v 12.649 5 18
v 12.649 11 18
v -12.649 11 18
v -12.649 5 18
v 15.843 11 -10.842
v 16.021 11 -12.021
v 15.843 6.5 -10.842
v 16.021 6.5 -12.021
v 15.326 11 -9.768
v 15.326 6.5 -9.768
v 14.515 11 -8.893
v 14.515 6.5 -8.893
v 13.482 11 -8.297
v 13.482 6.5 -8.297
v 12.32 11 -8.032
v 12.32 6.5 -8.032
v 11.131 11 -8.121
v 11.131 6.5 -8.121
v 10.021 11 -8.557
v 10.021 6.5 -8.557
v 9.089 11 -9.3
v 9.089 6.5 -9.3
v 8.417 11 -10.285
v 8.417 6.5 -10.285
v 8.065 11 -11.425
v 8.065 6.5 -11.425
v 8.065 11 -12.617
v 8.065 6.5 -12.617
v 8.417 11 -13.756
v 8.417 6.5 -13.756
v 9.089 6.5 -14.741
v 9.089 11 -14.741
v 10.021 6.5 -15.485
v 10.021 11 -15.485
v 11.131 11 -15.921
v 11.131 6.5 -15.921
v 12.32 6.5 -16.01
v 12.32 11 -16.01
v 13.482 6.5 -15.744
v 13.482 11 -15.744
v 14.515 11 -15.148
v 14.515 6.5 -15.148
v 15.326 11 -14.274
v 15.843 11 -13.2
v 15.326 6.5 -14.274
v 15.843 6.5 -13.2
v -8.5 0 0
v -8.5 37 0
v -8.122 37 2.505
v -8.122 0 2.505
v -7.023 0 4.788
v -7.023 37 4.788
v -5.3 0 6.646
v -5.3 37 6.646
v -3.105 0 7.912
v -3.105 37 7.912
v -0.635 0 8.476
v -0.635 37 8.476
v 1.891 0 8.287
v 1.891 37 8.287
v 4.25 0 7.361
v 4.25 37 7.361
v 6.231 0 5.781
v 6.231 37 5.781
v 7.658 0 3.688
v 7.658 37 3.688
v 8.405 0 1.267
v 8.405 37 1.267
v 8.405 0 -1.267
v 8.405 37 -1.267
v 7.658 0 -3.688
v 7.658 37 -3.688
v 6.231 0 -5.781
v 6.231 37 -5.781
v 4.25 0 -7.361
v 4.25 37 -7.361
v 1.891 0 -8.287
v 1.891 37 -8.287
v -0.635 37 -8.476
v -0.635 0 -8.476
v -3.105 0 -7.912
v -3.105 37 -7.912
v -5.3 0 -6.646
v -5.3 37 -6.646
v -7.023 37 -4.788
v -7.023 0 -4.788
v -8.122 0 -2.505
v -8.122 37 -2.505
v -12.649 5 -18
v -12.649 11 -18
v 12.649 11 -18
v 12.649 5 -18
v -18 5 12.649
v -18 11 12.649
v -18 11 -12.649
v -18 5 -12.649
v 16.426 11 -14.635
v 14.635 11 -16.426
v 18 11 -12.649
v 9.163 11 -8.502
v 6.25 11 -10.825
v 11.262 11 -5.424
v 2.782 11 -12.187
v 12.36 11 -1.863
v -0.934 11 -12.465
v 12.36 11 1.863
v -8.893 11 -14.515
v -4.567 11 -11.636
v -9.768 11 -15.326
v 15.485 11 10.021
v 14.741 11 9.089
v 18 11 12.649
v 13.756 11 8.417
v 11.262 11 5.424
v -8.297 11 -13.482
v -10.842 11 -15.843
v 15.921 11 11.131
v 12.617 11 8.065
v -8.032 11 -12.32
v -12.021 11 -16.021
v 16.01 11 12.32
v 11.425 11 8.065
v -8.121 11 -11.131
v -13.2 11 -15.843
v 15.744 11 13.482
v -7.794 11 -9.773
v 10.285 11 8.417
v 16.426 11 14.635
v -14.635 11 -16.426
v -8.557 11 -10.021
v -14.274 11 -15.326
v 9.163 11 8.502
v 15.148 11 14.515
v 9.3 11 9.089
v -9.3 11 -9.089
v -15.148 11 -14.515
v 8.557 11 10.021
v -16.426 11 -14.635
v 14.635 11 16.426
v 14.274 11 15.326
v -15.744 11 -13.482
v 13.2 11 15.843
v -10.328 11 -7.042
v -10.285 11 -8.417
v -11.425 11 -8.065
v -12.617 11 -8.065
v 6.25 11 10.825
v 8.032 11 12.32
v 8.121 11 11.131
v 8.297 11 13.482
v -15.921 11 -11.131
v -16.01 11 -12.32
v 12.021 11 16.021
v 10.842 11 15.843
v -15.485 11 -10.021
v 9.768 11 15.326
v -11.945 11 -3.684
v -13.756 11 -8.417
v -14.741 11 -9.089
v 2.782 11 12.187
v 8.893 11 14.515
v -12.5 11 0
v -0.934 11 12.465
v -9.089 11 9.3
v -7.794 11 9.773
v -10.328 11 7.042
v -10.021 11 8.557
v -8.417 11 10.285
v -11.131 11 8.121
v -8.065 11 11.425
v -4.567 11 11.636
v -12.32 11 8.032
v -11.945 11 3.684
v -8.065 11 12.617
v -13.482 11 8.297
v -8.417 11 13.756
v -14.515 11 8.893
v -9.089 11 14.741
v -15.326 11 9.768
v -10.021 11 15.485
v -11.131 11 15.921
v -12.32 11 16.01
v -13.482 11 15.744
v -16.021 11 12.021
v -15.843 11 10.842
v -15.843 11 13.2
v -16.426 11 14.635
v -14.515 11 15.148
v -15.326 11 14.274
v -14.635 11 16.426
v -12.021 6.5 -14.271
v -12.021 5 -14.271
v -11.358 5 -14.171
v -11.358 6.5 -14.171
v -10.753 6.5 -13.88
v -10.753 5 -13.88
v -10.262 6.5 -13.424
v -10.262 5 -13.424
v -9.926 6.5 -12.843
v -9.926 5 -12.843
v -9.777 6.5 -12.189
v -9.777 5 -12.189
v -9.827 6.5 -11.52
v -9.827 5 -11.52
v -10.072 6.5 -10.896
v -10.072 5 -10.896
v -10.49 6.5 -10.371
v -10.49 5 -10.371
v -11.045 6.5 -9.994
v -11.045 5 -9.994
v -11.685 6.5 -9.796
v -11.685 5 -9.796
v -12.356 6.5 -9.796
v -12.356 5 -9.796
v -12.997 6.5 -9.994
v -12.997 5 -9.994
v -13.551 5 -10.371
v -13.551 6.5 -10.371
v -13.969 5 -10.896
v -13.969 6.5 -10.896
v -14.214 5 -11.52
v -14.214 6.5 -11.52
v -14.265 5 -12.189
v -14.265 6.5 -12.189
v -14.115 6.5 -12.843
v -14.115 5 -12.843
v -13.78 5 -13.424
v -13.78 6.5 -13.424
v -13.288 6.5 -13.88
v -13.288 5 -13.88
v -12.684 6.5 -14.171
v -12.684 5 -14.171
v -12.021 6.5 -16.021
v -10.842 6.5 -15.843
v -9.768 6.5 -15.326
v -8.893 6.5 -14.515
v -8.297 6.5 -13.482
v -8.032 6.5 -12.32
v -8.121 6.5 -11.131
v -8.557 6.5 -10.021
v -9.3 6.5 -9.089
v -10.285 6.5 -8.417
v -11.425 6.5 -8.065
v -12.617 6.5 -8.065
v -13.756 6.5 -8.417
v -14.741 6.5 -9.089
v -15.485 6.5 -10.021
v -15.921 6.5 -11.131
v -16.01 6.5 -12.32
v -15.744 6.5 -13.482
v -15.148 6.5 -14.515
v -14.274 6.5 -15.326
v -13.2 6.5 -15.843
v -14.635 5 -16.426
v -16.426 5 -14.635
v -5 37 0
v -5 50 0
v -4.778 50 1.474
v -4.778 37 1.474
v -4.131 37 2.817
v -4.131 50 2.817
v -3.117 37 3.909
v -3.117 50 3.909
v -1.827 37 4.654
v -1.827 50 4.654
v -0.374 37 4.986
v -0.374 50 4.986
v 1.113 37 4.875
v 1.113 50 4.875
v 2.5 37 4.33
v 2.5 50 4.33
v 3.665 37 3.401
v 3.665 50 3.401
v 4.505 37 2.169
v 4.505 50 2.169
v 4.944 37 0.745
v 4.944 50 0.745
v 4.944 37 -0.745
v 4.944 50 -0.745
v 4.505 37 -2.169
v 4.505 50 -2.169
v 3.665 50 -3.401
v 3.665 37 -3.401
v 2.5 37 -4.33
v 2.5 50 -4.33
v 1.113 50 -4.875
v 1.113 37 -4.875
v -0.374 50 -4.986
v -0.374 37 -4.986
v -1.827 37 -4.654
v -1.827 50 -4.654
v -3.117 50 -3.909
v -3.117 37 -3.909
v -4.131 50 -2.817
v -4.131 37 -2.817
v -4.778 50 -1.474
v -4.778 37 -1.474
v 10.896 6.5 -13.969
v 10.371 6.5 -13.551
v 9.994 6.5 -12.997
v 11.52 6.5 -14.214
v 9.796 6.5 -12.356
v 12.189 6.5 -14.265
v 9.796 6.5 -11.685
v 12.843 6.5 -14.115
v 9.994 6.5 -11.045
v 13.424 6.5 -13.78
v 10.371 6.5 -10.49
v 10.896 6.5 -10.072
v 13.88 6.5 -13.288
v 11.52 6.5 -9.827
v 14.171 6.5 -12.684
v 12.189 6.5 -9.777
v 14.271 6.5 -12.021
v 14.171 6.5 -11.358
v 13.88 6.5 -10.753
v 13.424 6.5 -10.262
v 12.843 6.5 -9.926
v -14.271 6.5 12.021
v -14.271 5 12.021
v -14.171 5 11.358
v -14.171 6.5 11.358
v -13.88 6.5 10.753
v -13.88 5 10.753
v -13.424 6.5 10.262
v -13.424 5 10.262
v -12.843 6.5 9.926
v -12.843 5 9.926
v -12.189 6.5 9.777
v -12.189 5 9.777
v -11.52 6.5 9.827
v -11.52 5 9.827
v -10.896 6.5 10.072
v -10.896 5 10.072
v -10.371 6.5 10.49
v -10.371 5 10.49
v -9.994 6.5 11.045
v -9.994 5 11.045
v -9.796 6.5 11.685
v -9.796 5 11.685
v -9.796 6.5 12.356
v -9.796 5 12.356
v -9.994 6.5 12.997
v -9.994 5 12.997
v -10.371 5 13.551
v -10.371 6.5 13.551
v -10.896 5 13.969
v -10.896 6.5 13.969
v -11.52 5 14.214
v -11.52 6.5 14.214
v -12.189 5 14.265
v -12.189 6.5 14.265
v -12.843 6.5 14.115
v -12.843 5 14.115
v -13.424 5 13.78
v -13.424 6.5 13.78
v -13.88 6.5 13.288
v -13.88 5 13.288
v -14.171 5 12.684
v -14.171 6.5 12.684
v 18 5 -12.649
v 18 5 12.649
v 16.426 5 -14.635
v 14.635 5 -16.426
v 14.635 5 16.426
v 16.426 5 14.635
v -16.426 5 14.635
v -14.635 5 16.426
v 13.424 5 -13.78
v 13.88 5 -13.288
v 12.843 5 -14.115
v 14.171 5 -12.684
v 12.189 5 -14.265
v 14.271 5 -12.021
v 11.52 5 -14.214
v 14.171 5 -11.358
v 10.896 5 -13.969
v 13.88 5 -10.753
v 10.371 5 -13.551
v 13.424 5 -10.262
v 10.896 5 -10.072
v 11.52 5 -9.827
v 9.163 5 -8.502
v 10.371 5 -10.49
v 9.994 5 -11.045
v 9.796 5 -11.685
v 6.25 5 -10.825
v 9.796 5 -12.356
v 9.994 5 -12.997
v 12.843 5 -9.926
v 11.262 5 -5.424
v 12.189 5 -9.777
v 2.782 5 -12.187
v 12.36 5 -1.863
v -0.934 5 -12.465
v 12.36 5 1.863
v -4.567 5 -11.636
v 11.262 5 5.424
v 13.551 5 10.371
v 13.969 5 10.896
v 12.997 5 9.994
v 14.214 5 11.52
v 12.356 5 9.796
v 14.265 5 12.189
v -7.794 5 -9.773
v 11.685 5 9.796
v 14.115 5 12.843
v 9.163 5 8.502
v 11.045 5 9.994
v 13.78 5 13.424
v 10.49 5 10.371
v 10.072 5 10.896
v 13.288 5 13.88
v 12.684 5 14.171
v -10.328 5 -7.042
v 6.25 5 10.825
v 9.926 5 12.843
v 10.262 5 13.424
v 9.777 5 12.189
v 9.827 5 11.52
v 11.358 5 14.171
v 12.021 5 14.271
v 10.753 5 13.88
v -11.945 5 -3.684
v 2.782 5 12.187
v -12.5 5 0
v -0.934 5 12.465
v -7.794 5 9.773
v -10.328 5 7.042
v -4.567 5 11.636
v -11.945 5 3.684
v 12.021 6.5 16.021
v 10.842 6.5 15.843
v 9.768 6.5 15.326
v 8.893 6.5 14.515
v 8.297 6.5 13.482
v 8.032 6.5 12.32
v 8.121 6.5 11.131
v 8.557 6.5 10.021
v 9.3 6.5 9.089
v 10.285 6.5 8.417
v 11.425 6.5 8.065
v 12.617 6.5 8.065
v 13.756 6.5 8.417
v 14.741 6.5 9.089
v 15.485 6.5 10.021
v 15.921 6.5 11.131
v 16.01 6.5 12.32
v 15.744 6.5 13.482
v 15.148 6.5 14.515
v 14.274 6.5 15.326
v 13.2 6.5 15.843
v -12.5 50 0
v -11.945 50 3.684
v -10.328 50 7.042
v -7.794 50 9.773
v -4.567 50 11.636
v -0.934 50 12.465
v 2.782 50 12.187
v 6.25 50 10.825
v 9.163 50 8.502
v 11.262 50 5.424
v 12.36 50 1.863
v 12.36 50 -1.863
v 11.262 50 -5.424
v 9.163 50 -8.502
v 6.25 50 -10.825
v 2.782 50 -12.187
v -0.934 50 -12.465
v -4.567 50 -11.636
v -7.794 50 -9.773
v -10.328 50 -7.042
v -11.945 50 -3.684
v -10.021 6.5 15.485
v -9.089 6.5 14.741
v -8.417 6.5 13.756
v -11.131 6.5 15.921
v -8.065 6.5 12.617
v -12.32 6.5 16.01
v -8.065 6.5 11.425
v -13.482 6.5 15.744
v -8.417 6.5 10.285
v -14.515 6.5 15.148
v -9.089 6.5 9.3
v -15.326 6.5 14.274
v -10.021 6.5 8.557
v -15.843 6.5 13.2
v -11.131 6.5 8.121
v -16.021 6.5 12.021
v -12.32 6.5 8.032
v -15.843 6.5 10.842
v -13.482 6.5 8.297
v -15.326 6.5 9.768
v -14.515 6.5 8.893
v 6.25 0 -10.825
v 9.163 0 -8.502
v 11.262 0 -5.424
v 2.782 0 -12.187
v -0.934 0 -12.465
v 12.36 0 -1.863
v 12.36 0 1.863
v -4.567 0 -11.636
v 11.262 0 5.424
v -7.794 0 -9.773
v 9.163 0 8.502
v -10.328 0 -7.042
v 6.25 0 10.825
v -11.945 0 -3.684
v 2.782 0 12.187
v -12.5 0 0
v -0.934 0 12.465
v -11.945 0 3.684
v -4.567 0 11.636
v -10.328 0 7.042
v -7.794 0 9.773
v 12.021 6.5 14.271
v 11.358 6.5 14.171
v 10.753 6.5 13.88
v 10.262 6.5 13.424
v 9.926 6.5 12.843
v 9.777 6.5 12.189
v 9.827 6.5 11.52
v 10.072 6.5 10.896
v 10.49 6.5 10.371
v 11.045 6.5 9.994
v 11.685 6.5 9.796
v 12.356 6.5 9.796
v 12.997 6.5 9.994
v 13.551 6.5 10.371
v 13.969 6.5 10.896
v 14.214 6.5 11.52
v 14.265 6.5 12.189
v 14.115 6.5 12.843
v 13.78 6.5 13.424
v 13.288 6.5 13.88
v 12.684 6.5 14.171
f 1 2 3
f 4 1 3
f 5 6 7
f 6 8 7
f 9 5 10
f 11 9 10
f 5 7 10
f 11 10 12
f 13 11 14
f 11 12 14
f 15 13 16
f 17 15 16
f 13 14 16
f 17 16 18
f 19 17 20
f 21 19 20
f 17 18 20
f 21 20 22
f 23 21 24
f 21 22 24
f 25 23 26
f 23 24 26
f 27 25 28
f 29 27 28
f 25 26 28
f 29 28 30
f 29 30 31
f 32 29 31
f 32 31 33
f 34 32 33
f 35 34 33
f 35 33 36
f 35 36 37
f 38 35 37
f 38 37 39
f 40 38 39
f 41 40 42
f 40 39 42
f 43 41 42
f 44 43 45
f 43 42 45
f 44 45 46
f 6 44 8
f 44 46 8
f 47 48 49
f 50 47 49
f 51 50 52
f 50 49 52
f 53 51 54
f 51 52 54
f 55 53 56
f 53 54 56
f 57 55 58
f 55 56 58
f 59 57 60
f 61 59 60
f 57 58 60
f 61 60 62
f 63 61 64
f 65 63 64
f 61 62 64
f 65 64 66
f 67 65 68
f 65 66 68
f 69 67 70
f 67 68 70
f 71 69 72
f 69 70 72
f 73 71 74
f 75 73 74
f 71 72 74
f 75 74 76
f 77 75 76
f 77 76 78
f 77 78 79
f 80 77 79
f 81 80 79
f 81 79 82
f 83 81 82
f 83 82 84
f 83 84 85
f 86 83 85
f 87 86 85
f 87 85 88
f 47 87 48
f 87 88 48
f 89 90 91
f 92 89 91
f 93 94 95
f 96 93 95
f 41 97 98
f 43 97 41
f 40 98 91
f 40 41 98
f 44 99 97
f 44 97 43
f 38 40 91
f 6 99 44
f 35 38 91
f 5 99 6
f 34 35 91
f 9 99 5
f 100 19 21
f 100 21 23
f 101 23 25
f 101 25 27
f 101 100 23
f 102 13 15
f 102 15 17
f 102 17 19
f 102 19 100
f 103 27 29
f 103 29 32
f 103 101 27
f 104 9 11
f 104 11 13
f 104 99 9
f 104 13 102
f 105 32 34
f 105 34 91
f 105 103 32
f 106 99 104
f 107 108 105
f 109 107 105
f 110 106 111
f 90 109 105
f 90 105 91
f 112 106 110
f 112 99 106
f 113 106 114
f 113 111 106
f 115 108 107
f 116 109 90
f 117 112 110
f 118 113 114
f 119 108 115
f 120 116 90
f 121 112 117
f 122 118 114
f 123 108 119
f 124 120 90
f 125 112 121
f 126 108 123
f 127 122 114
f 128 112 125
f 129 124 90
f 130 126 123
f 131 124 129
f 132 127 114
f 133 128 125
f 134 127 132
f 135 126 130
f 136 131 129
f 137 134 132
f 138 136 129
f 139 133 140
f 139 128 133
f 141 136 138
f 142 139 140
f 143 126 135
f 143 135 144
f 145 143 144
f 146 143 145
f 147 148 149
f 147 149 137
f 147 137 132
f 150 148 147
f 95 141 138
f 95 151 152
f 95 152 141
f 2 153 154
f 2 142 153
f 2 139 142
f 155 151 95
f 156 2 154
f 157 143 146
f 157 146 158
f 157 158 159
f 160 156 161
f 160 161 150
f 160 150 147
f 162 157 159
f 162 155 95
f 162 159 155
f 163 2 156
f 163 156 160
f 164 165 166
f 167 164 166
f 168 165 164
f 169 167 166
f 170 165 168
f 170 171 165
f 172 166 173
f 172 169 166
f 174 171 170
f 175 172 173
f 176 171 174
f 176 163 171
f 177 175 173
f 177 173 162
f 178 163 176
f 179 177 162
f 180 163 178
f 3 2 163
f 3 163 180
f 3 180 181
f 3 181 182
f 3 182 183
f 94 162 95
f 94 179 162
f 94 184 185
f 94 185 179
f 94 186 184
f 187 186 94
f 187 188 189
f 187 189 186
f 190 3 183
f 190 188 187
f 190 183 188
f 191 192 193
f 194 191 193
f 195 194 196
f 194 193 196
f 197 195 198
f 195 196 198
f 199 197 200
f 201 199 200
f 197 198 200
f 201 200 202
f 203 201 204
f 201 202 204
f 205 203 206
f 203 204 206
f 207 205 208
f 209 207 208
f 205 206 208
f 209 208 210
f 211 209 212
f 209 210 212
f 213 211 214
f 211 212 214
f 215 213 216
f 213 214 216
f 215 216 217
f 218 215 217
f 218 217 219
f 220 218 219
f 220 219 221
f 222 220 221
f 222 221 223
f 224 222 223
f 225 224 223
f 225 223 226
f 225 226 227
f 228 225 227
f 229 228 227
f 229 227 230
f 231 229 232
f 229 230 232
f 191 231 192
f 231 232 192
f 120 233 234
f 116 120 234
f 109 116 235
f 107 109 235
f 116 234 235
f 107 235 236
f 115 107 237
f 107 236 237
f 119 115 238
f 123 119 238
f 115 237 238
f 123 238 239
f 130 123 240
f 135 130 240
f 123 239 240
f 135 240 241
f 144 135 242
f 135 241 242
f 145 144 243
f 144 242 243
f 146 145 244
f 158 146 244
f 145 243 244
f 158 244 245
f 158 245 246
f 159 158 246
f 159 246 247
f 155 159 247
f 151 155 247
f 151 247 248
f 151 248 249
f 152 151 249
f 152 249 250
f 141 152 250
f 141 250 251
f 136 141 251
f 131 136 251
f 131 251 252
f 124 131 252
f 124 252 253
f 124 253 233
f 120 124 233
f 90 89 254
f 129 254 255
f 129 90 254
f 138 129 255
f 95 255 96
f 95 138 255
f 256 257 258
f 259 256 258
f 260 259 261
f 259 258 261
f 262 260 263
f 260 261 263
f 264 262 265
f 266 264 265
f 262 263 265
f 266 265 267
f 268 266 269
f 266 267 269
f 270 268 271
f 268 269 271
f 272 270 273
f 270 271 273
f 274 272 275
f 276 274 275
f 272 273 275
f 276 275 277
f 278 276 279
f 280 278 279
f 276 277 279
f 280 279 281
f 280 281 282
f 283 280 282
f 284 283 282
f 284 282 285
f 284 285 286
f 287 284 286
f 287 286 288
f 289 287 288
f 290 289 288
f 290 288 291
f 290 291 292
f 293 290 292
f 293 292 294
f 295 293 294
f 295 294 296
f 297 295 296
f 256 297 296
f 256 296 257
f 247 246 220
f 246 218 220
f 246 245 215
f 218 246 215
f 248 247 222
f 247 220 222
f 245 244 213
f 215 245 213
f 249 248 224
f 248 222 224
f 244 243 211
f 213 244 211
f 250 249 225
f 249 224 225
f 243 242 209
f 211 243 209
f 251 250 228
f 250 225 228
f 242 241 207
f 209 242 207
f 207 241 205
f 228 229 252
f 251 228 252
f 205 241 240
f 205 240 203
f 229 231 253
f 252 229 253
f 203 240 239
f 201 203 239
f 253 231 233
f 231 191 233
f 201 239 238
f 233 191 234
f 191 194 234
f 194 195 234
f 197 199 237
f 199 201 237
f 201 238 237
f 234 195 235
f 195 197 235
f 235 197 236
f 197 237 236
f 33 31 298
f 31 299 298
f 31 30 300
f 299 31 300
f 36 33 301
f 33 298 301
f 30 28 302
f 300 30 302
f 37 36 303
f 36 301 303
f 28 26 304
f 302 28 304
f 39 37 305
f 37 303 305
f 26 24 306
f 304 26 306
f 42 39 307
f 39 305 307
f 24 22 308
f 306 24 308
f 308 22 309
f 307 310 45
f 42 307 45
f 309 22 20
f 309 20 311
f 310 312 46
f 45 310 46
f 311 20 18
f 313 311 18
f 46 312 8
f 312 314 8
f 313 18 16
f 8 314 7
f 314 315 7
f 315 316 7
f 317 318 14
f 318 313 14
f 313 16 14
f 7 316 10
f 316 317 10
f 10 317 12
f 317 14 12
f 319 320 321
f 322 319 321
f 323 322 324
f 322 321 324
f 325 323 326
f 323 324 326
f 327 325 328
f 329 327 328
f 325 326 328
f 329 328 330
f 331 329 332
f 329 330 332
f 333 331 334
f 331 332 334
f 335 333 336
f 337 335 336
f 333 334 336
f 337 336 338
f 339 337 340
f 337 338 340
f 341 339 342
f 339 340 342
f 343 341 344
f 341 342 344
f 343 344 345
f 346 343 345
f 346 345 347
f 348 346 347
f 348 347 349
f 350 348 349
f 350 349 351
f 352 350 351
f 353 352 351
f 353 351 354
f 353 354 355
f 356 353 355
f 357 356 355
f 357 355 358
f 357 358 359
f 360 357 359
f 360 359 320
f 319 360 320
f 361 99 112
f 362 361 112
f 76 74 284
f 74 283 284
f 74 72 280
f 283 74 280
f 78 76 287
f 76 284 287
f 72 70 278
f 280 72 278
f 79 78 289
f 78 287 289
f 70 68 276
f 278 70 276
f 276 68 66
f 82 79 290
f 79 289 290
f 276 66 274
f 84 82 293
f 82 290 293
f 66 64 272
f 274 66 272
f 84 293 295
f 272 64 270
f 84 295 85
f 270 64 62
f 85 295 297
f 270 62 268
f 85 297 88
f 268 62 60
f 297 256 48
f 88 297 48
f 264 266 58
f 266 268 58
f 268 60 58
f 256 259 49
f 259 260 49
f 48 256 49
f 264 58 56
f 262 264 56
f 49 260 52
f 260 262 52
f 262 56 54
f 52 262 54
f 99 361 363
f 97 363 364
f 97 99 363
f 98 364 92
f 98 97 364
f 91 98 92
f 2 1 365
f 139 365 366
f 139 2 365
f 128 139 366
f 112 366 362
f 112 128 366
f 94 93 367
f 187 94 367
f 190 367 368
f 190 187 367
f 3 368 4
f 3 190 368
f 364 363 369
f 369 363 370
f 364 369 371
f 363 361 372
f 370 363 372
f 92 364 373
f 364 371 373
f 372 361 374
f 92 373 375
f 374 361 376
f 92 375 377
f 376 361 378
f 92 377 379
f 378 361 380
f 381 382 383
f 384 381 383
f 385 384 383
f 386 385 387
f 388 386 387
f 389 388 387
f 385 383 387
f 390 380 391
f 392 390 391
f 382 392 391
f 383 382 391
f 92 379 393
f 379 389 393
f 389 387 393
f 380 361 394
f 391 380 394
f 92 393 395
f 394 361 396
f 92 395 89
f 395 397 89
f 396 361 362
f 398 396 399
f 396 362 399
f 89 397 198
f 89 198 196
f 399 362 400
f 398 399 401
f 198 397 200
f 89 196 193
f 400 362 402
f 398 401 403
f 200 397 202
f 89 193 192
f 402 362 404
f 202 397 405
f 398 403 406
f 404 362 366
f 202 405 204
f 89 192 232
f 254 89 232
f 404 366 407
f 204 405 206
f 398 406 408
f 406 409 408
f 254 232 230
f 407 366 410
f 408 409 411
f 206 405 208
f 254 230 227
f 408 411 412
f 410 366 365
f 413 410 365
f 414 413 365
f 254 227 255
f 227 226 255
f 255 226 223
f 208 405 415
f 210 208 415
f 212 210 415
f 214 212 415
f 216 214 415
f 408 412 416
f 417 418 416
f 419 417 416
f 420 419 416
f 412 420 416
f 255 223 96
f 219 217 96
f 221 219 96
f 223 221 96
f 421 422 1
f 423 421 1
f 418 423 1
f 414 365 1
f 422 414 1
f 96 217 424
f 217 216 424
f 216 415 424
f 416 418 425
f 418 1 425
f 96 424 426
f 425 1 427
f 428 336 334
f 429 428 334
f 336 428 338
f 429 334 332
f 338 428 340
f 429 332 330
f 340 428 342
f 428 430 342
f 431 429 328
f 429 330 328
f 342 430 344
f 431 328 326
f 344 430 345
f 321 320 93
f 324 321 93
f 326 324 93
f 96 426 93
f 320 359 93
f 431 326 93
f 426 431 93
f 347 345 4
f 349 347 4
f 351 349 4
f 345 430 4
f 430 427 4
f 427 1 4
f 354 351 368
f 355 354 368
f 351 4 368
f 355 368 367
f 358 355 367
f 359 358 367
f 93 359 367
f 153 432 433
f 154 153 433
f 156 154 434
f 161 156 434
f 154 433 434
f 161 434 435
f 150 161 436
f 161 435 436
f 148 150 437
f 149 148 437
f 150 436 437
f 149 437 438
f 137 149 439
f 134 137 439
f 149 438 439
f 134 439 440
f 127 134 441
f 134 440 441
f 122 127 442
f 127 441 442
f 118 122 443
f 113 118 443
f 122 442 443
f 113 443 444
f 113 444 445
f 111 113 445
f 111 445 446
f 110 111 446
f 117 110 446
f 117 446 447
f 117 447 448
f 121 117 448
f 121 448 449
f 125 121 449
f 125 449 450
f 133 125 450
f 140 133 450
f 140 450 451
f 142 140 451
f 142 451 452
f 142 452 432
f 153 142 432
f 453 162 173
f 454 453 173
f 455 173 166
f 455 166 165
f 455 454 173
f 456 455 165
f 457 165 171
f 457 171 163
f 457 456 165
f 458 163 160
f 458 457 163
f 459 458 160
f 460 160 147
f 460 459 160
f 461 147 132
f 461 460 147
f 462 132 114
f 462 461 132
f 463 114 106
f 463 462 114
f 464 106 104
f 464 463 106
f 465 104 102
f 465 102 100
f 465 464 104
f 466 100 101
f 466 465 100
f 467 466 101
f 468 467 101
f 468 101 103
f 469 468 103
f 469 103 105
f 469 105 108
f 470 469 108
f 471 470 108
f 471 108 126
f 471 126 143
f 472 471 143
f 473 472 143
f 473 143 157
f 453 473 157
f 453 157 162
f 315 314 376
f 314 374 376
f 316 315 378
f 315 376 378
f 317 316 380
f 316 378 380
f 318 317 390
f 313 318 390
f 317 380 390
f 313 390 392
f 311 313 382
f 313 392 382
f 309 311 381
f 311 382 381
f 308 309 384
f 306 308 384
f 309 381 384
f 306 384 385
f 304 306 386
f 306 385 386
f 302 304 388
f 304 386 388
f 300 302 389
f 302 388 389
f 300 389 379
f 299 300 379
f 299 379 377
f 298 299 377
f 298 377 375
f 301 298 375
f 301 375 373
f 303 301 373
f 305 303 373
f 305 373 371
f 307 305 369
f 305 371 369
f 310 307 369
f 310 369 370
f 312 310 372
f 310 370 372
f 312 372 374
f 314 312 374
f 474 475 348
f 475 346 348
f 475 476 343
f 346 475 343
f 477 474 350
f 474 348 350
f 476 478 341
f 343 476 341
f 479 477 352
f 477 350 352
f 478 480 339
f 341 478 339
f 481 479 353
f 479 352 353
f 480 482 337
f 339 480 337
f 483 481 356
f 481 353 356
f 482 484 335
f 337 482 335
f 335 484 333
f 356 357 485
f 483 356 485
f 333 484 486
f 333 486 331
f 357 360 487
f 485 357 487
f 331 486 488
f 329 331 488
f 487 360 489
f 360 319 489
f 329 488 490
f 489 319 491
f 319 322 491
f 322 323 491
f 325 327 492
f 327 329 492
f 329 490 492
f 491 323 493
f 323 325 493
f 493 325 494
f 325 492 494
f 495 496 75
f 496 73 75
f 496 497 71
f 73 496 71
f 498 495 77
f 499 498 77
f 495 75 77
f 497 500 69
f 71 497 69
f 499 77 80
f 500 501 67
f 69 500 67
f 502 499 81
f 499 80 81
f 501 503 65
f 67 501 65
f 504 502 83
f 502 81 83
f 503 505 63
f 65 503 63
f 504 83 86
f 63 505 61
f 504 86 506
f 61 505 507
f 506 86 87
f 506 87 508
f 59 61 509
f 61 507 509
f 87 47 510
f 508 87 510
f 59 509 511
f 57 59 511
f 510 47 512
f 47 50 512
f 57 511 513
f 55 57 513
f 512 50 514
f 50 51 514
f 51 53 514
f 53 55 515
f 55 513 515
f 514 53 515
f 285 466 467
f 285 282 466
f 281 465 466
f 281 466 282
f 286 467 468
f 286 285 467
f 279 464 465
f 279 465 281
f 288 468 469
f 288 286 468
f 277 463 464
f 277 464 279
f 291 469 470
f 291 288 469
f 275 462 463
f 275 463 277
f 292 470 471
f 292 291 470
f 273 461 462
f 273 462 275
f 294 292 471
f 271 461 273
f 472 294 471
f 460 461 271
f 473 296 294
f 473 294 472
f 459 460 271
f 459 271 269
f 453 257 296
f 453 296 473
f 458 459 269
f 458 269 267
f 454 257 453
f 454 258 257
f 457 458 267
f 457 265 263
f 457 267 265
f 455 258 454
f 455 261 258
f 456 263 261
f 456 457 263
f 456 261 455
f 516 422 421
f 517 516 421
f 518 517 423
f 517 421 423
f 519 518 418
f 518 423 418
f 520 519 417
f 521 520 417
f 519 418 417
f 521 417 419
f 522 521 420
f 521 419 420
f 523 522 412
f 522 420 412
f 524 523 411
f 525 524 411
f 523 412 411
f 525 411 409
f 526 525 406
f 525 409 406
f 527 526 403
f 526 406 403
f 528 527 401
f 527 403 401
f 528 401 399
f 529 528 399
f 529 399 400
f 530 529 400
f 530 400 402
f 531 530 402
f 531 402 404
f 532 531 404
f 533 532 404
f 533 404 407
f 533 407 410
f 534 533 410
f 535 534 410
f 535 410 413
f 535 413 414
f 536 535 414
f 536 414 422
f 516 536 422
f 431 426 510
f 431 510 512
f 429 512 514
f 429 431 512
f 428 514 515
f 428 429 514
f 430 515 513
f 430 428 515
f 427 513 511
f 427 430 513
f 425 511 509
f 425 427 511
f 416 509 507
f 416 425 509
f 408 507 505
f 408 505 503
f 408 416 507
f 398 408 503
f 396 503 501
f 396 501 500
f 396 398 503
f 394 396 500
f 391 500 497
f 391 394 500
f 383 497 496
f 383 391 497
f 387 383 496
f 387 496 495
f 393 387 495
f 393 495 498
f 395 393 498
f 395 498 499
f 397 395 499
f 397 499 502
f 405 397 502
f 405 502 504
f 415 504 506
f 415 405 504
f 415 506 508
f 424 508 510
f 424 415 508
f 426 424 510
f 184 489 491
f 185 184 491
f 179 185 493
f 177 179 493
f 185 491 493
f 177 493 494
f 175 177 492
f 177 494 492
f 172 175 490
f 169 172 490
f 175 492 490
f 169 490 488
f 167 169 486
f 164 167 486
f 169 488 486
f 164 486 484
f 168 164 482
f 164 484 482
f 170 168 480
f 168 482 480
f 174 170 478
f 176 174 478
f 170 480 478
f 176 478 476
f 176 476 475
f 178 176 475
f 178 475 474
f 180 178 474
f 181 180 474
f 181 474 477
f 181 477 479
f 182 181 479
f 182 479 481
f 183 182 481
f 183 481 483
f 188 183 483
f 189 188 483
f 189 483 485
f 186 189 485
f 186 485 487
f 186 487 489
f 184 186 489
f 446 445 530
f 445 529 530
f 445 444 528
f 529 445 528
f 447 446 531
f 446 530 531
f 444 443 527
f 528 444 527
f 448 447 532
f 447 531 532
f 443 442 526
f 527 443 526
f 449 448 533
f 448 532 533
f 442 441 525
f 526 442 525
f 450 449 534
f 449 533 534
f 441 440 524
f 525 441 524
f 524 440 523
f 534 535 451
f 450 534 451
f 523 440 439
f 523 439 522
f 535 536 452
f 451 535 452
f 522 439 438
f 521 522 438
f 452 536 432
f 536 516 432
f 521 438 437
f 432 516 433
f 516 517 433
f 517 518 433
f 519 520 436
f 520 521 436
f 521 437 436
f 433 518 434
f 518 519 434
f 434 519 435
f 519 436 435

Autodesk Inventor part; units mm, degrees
ref_plane "YZ Plane" through (0, 0, 0) normal (1, 0, 0) x (0, 1, 0)
ref_plane "XZ Plane" through (0, 0, 0) normal (0, 1, 0) x (-1, 0, 0)
ref_plane "XY Plane" through (0, 0, 0) normal (0, 0, 1) x (1, 0, 0)
sketch "Esboço1" plane through (0, 0, 0) normal (0, 0, 1) x (1, 0, 0)
  line L0 (0, 0) -> (0, 50)
  line L1 (-8.5, 0) -> (-8.5, 37)
  line L2 (-8.5, 37) -> (-5, 37)
  line L3 (-5, 37) -> (-5, 50)
  line L4 (-8.5, 0) -> (-12.5, 0)
  line L5 (-12.5, 0) -> (-12.5, 5)
  line L6 (-12.5, 5) -> (-22, 5)
  line L7 (-22, 5) -> (-22, 11)
  line L8 (-22, 11) -> (-12.5, 11)
  line L9 (-12.5, 11) -> (-12.5, 50)
  line L10 (-12.5, 50) -> (-5, 50)
  dimension "d0" = 50
  dimension "d1" = 17
  dimension "d2" = 10
  dimension "d3" = 13
  dimension "d4" = 25
  dimension "d5" = 44
  dimension "d6" = 5
  dimension "d7" = 6
revolve "Revolução1" add sketch "Esboço1" angle 360 about axis through (0, 0, 0) along (0, 1, 0)
sketch "Esboço2" plane through (0, 11, 0) normal (0, 1, 0) x (1, 0, 0)
  circle A0 centre (0, 0) radius 22 projected
  circle A1 centre (0, 0) radius 12.5 projected
  line L0 (-12.6491, 18) -> (12.6491, 18)
  arc A2 (12.6491, 18) -> (-12.6491, 18) centre (0, 0) ccw
  dimension "d9" = 18
extrude "Extrusão1" cut sketch "Esboço2" against normal up to next contours L0 A0 picked at (-0.8962, 19.2784)
pattern_circular "Padrão circular1" count 4 over 360 about axis through (0, -10, 0) along (0, 1, 0) of "Extrusão1"
sketch "Esboço3" plane through (-12.6491, 11, -18) normal (0, 1, 0) x (1, 0, 0)
  circle A0 centre (12.6491, -18) radius 12.5 projected
  line L0 (24.6699, -30.0208) -> (12.6491, -18)
  line L1 (12.6491, -18) -> (30.6491, -18)
  line L2 (30.6491, -5.3509) -> (30.6491, -30.6491) projected
  dimension "d15" = 45
  dimension "d16" = 17
hole "Furo1" at (12.0208, 11, 12.0208) direction (0, -1, 0) diameter 4.5 end through all counterbore diameter 8 counterbore depth 4.5 clearance for "Socket Head Cap Screw DIN EN ISO 4762" size "M4" standard "DIN"
pattern_circular "Padrão circular2" count 4 over 360 about axis through (0, -10, 0) along (0, 1, 0) of "Furo1"
